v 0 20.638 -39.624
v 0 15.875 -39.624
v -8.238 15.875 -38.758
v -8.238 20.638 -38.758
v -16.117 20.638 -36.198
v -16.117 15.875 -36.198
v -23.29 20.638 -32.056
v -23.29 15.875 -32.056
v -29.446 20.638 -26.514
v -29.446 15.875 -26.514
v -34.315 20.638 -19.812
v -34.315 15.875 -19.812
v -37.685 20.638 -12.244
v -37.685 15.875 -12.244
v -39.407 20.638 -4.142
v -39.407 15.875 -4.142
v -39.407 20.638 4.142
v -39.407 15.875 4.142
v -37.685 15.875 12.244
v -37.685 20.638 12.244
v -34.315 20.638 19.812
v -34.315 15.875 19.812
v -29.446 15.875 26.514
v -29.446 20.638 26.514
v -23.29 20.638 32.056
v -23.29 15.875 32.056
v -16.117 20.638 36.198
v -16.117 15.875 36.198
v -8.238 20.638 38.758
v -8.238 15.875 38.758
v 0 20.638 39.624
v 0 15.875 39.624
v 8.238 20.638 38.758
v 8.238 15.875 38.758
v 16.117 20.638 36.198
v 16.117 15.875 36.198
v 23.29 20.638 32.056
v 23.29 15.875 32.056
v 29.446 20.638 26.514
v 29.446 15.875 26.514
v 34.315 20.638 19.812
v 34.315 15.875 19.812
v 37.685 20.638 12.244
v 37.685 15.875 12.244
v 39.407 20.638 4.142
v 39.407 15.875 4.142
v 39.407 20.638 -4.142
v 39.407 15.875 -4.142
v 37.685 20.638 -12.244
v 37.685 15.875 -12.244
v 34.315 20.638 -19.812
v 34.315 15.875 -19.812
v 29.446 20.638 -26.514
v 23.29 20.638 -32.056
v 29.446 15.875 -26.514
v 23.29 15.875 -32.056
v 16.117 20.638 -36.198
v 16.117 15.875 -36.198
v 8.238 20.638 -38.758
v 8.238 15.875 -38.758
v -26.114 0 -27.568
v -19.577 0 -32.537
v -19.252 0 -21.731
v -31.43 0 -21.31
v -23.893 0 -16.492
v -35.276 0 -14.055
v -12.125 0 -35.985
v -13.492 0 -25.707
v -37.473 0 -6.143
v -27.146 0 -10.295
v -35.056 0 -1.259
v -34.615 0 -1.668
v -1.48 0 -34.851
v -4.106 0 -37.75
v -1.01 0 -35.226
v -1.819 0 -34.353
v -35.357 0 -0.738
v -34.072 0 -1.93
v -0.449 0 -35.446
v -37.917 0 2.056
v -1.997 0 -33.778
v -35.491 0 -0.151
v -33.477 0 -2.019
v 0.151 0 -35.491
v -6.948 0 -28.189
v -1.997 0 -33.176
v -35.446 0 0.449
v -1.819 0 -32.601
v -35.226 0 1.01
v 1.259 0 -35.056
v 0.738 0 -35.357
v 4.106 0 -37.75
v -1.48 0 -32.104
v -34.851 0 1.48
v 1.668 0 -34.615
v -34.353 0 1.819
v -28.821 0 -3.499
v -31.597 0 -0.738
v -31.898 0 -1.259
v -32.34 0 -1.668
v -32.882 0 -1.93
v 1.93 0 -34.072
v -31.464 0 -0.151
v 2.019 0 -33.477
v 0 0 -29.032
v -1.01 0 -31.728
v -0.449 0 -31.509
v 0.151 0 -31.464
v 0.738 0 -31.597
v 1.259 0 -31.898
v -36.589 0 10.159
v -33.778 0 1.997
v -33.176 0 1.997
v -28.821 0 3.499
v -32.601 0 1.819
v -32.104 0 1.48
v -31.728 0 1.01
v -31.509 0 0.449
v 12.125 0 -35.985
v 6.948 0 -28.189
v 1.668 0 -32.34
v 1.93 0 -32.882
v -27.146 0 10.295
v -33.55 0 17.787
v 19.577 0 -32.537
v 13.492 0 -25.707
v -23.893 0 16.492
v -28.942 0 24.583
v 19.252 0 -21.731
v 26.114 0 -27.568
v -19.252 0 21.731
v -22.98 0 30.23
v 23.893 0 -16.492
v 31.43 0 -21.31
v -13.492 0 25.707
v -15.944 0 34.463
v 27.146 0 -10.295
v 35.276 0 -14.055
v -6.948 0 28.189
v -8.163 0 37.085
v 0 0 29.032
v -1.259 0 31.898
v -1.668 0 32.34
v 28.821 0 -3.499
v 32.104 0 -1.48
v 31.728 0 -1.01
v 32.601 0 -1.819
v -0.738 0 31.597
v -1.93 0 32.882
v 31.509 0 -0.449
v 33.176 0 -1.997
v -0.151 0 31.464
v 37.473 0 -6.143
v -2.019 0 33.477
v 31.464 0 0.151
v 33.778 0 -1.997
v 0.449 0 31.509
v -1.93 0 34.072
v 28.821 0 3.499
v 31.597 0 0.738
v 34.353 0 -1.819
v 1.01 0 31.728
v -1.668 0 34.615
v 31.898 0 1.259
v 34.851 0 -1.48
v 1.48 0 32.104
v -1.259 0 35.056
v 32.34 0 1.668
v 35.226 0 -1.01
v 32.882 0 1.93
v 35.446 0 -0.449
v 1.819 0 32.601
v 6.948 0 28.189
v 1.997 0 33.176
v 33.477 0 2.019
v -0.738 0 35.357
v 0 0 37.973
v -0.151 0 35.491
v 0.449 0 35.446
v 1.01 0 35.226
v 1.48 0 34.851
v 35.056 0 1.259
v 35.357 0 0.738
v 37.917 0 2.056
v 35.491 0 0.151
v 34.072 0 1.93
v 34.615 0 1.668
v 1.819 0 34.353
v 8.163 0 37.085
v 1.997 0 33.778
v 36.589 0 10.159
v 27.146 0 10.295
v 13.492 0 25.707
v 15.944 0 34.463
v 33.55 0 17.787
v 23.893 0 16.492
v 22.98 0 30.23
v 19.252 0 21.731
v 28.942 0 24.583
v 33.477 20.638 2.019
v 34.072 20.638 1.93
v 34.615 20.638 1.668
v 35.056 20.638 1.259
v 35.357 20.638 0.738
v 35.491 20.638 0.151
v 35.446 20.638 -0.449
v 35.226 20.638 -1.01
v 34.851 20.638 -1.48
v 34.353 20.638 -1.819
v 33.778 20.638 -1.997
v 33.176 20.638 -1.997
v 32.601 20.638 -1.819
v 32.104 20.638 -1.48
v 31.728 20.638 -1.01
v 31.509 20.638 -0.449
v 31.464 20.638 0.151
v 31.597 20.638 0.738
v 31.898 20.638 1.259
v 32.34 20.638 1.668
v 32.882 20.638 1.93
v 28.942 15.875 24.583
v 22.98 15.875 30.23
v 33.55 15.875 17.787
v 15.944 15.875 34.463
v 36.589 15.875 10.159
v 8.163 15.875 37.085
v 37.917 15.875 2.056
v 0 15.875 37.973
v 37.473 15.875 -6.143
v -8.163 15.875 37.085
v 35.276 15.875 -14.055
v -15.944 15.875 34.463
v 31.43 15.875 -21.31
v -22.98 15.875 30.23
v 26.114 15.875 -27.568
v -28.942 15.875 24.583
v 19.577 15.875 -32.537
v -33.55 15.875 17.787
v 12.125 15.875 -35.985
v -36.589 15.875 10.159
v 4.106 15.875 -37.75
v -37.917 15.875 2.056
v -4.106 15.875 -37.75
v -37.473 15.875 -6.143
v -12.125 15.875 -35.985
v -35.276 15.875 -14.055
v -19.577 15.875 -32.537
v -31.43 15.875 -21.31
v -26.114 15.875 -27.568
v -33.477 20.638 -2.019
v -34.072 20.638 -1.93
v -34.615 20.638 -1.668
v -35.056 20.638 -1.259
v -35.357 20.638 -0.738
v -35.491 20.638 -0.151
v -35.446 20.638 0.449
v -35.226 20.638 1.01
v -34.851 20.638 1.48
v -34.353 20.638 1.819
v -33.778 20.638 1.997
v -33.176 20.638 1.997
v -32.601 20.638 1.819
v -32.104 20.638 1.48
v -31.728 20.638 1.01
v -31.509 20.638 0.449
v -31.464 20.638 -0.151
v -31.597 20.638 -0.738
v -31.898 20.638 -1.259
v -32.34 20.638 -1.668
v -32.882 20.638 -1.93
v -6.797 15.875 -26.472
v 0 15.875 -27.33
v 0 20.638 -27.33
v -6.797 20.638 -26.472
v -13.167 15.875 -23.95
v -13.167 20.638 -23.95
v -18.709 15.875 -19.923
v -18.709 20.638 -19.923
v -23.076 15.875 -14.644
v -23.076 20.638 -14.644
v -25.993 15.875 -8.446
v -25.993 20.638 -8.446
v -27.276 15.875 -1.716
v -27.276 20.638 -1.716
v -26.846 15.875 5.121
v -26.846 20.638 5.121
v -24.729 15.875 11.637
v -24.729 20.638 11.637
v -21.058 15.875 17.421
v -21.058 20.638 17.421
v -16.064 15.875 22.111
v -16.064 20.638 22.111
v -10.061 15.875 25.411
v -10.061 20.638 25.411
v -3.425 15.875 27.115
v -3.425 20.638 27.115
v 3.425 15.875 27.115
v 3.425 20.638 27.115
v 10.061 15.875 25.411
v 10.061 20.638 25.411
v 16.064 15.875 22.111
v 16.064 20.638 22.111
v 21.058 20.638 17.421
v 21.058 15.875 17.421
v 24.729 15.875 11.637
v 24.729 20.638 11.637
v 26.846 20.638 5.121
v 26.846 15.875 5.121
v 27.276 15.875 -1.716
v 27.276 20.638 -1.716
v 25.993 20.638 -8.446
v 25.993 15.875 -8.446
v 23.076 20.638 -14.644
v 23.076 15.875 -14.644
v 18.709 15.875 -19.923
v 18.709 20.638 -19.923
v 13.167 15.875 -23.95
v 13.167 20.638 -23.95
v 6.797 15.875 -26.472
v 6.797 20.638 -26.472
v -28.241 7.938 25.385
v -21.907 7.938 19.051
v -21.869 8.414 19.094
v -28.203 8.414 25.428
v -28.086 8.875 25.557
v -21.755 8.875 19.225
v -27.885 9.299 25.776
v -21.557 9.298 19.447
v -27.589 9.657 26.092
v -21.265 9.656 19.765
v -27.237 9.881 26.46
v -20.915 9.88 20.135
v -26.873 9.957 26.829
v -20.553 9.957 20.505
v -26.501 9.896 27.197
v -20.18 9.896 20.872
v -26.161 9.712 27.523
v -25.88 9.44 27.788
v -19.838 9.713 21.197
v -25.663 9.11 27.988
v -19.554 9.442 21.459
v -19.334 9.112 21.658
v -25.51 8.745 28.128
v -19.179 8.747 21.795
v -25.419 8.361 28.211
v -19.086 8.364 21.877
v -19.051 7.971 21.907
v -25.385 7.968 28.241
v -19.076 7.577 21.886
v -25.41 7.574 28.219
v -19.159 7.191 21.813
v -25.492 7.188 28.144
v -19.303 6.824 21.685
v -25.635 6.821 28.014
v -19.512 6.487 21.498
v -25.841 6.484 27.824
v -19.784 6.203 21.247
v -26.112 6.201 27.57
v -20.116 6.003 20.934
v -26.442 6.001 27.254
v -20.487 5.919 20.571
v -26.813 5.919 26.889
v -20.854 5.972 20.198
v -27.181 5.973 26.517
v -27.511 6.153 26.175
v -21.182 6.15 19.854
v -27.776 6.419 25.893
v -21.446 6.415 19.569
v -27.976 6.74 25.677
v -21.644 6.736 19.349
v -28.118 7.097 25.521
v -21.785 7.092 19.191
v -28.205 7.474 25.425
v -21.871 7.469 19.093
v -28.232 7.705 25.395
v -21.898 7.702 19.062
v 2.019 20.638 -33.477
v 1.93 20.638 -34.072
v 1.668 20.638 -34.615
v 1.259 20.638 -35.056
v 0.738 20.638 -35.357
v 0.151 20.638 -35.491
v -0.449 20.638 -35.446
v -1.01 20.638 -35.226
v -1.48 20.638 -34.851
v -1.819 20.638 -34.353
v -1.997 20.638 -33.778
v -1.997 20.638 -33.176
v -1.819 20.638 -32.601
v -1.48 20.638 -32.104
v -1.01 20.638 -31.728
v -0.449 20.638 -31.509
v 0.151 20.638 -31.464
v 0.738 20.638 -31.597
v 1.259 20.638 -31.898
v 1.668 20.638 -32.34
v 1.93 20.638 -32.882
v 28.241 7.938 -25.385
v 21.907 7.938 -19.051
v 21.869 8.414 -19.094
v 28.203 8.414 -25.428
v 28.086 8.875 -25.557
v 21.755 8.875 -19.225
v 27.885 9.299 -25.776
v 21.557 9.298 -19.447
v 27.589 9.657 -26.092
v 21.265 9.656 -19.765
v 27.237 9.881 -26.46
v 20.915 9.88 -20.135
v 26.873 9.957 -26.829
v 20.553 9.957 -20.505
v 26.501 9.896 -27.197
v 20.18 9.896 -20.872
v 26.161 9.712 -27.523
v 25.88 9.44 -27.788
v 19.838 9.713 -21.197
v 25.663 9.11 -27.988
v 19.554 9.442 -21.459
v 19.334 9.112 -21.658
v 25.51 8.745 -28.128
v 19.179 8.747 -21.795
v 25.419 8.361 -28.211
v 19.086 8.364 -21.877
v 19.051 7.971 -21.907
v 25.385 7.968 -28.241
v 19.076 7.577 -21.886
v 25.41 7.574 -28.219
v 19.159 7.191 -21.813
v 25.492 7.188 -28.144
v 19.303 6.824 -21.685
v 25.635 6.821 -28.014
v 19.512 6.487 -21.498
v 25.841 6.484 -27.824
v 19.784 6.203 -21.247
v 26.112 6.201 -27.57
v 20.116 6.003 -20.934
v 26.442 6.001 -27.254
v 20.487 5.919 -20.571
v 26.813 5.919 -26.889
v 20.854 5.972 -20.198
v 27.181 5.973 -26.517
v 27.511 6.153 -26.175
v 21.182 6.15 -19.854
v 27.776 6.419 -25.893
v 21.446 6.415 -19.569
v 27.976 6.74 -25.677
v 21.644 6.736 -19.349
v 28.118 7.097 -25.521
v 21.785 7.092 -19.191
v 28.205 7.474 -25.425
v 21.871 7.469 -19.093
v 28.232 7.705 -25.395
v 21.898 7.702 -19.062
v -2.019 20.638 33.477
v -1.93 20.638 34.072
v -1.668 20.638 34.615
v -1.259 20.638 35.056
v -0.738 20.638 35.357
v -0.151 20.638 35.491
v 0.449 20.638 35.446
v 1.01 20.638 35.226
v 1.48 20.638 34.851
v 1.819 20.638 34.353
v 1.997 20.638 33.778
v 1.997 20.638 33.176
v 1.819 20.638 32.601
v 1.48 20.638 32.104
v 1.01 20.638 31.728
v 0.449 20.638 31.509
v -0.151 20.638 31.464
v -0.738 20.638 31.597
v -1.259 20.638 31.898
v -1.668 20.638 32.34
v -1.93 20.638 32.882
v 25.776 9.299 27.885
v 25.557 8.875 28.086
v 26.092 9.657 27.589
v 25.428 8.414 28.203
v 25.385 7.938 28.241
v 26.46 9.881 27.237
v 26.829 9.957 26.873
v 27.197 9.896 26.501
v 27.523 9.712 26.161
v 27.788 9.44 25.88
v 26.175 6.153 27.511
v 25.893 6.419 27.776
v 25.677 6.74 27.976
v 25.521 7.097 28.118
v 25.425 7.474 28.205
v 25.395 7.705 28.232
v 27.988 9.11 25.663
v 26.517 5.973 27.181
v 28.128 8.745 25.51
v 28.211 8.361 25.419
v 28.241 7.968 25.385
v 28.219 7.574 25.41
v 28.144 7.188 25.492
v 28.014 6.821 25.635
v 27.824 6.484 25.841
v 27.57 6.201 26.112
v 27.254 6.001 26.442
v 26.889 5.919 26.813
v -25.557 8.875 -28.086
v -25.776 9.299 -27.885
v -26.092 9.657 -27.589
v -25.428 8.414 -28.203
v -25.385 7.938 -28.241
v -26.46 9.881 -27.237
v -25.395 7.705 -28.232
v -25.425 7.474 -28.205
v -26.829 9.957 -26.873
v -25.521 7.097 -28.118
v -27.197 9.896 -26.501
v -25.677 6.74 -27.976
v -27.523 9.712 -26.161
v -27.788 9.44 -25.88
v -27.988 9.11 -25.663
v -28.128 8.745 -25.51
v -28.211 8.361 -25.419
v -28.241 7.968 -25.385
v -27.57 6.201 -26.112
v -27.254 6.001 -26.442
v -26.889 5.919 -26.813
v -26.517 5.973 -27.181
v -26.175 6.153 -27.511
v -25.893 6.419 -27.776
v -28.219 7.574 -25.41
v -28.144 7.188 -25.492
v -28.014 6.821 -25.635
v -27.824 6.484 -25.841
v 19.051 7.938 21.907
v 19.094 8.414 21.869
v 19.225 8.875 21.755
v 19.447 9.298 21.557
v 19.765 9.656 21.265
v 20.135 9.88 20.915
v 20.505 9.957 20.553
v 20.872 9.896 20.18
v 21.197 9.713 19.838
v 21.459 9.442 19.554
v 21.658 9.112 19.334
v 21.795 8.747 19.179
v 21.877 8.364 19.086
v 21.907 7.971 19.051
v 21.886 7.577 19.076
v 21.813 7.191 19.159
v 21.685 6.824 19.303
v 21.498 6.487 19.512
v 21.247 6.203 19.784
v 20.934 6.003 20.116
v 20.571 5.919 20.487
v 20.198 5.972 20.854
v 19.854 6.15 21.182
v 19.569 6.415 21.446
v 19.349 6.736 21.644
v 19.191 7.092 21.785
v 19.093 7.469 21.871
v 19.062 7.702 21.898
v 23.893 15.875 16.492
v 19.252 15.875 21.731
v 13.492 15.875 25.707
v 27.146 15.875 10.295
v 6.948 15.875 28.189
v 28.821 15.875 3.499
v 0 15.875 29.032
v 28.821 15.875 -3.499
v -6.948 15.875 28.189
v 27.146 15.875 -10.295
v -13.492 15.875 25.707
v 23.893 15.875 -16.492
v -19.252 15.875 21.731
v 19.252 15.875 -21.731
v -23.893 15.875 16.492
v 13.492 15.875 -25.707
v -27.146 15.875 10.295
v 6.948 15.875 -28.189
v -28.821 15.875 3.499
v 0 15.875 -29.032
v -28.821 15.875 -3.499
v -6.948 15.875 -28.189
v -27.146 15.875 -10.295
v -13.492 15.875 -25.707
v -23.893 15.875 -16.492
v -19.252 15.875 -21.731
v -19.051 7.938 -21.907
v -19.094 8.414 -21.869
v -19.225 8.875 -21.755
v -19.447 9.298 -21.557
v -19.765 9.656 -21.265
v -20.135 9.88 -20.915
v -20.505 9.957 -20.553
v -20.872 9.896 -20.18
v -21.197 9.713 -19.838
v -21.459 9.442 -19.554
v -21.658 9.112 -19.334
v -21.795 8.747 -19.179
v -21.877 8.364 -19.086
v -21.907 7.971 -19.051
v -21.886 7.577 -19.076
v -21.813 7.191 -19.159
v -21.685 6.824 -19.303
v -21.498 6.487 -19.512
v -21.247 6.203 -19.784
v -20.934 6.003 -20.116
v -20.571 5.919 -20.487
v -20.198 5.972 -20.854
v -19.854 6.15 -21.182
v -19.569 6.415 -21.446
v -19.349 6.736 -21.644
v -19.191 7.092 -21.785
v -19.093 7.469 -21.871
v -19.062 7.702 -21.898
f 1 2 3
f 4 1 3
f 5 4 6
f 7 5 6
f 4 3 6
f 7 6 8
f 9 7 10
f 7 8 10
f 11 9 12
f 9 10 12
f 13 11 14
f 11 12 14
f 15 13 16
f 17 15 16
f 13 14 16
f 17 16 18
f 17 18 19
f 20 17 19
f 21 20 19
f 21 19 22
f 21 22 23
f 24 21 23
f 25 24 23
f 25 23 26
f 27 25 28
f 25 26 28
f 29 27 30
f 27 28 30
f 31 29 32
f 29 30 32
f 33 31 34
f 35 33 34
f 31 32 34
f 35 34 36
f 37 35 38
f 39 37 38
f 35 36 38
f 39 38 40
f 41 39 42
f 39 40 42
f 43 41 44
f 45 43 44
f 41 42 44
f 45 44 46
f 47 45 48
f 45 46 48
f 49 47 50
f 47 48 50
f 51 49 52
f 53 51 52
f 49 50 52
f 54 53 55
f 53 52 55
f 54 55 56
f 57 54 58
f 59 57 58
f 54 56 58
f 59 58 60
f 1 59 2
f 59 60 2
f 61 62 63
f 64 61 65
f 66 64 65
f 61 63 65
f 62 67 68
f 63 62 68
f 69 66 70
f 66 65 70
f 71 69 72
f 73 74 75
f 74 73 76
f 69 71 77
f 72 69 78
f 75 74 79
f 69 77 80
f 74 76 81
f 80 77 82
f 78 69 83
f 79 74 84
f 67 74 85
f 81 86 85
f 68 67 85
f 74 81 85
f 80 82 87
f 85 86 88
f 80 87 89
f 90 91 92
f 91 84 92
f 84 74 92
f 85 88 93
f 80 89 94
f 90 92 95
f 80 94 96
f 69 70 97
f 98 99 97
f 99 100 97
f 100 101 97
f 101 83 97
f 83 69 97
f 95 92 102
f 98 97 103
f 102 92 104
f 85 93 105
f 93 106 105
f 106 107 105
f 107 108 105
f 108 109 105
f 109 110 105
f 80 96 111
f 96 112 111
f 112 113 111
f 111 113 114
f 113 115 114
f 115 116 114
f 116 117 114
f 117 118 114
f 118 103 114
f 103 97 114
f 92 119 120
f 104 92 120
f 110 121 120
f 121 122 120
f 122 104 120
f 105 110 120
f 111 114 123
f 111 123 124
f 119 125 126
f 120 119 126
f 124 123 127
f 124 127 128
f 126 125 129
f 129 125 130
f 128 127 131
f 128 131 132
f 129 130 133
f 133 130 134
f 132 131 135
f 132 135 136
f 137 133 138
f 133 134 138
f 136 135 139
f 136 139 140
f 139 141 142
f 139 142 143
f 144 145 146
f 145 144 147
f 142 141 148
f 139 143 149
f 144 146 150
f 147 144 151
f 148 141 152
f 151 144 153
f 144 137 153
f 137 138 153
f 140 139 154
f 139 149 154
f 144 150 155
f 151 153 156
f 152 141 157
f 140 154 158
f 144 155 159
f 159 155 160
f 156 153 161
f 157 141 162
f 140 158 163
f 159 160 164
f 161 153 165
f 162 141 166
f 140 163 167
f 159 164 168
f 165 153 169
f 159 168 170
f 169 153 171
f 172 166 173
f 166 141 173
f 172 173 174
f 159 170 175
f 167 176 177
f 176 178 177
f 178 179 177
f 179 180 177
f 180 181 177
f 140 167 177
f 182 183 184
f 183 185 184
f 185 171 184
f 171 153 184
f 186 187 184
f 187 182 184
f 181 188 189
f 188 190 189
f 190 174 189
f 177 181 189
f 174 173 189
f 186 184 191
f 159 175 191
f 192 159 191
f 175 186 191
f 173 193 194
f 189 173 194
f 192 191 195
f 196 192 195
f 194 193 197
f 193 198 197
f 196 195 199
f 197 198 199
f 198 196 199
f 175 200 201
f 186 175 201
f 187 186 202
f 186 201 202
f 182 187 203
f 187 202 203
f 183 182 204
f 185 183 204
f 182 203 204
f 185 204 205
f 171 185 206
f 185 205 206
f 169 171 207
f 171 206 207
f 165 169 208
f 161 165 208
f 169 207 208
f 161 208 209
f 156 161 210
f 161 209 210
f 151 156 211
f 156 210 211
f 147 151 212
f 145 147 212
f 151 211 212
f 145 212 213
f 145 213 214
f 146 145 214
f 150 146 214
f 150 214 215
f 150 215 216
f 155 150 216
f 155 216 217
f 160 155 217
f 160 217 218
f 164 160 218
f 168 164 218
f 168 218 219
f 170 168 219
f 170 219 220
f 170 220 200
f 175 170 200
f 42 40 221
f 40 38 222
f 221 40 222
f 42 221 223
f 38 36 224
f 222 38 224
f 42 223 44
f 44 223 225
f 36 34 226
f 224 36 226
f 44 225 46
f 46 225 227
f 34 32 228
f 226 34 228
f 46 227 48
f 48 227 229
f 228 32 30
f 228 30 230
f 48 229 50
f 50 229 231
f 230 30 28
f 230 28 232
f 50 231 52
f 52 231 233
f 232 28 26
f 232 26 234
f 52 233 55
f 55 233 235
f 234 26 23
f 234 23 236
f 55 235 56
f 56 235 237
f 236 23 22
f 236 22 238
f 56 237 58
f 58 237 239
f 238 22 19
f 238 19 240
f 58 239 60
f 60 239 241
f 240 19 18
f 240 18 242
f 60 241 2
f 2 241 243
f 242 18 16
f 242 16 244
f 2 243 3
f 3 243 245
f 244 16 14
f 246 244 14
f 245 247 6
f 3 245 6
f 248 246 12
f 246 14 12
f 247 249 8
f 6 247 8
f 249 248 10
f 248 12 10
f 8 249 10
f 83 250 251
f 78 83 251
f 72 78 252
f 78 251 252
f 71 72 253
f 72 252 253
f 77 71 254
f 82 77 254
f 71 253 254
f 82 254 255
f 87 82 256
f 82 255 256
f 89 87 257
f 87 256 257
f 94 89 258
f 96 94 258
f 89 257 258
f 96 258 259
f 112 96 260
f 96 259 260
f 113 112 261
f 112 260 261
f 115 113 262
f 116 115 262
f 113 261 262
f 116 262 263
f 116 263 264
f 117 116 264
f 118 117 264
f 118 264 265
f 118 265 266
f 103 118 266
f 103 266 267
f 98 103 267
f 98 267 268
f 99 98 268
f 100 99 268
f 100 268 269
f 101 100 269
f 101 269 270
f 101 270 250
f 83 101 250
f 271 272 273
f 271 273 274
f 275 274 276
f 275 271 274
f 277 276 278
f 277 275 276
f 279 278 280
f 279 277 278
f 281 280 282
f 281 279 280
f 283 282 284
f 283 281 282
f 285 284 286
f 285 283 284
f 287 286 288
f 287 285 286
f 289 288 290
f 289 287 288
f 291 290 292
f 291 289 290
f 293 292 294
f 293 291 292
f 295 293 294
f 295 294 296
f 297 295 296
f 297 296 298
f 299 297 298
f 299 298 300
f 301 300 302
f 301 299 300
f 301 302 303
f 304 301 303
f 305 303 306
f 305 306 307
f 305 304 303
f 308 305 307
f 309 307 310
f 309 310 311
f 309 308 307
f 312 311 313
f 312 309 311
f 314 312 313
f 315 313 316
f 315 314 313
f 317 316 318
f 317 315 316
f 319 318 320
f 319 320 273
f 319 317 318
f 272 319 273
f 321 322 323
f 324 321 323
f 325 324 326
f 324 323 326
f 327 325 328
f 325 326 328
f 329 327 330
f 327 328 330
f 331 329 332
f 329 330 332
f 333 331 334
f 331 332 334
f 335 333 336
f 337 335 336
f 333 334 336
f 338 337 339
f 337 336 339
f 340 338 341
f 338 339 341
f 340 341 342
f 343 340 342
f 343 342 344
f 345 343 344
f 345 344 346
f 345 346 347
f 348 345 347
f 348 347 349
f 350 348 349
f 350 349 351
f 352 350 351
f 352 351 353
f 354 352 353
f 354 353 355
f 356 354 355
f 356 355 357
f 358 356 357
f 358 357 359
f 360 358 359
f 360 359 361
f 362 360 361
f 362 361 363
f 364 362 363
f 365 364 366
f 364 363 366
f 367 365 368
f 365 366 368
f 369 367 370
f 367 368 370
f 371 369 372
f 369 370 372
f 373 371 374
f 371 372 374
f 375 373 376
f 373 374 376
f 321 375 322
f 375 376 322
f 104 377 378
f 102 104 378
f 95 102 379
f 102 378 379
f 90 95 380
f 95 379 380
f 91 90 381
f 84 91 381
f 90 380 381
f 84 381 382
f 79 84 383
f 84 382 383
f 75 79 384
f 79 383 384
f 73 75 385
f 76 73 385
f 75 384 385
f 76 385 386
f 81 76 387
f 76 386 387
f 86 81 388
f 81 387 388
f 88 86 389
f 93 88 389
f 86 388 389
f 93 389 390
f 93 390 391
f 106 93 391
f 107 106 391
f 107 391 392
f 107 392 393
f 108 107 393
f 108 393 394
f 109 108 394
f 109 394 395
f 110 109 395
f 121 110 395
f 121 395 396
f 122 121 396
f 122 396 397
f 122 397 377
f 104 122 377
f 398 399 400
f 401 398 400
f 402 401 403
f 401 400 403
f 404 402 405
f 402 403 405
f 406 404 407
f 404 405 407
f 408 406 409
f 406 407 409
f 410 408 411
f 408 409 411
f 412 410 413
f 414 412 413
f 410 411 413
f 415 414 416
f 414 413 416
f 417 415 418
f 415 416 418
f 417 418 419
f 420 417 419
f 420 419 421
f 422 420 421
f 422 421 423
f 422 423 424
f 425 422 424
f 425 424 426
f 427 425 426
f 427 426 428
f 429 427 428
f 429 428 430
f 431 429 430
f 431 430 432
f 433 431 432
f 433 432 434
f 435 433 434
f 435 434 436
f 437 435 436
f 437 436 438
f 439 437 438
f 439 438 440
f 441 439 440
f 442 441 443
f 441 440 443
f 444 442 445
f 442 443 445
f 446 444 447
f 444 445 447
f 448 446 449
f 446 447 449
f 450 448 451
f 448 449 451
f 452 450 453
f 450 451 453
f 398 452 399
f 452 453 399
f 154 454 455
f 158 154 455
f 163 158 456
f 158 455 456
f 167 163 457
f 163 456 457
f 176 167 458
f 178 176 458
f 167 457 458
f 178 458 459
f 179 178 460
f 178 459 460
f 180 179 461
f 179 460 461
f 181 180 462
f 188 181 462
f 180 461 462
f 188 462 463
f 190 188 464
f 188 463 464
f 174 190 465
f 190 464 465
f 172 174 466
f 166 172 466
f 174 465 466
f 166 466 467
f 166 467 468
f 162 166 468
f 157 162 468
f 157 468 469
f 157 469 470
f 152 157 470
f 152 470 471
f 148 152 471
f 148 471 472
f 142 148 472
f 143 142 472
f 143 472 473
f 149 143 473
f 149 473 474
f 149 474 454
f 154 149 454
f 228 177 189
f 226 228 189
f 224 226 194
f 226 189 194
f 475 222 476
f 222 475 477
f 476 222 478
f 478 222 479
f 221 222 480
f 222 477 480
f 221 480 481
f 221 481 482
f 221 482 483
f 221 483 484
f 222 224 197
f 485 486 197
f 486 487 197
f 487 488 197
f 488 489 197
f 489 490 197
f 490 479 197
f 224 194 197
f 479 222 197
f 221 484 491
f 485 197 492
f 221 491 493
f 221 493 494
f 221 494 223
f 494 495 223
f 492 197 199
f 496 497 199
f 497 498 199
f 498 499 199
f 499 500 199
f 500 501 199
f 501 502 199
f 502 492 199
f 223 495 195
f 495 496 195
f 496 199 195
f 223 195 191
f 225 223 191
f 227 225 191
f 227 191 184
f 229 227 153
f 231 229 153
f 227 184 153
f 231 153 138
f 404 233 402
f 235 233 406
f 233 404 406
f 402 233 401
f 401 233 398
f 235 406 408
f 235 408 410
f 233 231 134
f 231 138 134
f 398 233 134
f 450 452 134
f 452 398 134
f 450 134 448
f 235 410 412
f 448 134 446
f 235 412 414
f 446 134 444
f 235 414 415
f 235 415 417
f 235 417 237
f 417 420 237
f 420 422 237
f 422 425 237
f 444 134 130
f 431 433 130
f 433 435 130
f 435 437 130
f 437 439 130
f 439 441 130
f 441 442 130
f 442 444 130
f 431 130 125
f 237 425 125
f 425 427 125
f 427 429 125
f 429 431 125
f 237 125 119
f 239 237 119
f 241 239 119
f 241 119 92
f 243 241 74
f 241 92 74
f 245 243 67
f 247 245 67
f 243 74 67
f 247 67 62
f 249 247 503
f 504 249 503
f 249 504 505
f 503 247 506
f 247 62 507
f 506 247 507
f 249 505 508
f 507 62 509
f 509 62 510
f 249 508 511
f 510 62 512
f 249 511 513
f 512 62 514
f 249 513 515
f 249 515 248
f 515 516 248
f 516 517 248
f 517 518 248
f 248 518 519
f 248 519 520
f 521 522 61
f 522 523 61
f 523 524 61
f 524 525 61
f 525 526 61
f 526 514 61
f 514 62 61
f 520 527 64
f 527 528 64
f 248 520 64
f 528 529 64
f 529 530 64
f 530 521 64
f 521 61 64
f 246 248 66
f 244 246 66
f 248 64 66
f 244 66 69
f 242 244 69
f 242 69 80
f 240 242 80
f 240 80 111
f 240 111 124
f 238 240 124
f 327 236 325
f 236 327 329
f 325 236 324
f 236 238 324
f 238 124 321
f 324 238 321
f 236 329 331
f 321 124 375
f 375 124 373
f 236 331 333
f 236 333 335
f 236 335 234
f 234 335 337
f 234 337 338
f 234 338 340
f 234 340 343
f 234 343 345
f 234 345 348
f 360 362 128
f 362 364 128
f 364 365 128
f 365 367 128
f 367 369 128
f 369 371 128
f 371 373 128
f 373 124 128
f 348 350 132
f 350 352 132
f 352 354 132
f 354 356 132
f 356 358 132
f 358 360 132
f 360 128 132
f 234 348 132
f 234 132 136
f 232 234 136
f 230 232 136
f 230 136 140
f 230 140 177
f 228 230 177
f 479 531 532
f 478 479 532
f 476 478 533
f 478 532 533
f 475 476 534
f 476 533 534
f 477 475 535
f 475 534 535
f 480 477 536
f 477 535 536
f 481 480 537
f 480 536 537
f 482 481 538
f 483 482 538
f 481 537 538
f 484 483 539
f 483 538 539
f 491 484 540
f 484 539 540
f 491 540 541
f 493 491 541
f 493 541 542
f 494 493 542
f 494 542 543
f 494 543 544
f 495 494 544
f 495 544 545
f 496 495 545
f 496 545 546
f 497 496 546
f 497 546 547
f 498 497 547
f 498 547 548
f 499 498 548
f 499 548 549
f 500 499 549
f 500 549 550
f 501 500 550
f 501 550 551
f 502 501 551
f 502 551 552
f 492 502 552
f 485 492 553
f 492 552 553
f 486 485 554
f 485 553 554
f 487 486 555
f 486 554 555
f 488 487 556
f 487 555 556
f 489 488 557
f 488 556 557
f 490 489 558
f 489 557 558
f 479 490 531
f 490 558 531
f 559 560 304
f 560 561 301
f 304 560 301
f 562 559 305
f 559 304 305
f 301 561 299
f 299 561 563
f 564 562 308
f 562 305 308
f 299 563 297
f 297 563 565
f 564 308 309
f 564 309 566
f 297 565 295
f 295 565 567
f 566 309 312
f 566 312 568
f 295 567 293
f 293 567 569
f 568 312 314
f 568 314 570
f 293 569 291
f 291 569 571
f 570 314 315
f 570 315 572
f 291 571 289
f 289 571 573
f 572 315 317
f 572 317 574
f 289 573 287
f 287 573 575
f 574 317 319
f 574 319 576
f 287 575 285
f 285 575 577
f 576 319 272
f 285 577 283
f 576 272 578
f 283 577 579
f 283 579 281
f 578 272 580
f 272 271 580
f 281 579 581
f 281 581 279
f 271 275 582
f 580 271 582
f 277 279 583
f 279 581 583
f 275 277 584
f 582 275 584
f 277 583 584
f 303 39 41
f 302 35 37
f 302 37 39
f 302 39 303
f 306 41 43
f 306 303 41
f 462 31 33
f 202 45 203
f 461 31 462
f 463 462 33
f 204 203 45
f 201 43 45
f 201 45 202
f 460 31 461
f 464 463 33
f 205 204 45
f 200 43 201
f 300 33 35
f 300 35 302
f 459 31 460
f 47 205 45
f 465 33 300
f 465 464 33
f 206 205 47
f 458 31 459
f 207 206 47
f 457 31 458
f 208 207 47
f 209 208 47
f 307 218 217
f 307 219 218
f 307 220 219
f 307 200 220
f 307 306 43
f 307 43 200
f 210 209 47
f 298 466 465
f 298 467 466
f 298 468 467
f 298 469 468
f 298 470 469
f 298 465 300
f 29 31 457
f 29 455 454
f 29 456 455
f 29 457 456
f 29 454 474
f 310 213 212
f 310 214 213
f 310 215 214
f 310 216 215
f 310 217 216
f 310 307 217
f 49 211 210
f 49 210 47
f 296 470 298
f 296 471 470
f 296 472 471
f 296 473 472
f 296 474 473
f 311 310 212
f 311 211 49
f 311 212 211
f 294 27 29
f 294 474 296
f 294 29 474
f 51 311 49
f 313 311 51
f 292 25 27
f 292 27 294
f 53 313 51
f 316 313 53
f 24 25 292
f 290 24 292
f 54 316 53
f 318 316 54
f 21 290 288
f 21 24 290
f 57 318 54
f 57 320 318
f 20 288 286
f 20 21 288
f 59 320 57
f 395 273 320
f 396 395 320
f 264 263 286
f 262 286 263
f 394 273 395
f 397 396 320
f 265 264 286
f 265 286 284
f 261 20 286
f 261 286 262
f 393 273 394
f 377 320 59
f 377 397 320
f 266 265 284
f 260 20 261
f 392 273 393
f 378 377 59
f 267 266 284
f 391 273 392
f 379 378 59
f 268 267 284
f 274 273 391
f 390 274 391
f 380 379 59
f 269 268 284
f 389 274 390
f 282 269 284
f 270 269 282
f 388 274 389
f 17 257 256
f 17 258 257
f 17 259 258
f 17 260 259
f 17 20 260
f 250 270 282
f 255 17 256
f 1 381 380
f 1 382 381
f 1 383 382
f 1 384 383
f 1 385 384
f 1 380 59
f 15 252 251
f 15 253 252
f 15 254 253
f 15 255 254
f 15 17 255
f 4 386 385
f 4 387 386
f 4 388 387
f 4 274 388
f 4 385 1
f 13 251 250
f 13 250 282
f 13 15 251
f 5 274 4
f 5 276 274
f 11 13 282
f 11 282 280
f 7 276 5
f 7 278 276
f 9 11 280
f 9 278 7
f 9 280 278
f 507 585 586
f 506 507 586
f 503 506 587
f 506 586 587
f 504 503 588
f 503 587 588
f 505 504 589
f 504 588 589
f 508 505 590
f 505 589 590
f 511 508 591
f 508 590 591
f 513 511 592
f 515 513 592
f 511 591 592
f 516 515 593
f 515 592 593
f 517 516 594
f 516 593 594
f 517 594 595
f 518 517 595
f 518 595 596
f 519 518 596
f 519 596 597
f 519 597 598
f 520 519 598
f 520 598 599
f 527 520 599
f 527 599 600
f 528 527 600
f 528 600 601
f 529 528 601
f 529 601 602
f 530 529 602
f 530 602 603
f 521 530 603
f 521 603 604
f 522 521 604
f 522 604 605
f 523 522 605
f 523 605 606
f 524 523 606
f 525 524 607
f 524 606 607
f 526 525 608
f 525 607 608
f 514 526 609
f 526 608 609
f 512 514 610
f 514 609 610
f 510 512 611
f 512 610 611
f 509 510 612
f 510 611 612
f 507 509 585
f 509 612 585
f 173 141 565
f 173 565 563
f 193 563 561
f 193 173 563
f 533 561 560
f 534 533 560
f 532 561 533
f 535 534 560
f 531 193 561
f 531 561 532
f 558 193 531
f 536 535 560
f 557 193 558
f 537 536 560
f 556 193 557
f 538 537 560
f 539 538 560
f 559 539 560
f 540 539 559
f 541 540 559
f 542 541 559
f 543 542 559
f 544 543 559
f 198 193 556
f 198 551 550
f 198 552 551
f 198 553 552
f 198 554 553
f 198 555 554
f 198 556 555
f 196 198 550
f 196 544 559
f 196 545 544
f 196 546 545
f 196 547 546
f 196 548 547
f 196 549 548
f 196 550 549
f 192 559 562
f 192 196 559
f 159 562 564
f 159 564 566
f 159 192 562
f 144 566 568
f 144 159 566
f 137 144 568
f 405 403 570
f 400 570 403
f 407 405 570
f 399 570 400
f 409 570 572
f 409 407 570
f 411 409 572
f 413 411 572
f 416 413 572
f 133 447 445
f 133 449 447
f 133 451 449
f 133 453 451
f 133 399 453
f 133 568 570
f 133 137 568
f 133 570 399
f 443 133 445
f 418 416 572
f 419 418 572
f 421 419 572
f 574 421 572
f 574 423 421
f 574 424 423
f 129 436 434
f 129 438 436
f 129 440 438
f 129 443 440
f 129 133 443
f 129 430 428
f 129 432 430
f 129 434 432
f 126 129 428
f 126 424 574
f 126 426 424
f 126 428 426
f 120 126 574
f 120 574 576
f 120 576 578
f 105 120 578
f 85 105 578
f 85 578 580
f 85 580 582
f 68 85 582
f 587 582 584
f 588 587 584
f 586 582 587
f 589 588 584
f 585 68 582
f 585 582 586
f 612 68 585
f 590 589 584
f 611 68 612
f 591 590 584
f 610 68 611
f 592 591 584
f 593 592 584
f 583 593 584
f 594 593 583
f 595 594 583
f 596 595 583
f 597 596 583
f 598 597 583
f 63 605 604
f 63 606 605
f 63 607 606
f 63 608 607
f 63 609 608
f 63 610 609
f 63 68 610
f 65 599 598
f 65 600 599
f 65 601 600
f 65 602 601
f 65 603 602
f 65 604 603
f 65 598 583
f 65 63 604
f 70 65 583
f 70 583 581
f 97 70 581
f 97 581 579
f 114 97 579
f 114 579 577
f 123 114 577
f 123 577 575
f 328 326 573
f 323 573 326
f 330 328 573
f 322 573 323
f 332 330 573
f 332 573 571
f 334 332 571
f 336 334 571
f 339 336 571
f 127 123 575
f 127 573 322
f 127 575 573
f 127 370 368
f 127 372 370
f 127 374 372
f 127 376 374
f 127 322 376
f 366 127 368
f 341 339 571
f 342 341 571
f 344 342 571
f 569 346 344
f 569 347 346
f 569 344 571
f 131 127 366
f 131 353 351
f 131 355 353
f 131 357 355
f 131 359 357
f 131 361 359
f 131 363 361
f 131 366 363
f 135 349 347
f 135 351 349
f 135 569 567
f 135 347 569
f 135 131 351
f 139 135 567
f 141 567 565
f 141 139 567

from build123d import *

# Parameters (mm, degrees)
SKETCH1_R           = 37.973
SKETCH1_R_2         = 29.0322
BOSS_EXTRUDE1_DEPTH = 15.875
SKETCH3_R           = 39.624
SKETCH3_R_2         = 27.3304
BOSS_EXTRUDE2_DEPTH = 4.7625
SKETCH4_R           = 2.0193
CUT_EXTRUDE1_DEPTH  = 38.5445
CIRPATTERN2_COUNT   = 4
SKETCH5_R           = 2.0193
CUT_EXTRUDE2_DEPTH  = 52.2605
CIRPATTERN3_COUNT   = 4


with BuildPart() as part:
    # Sketch1 → Boss-Extrude1 (new body)
    with BuildSketch(Plane(origin=(0, 0, 0), x_dir=(1, 0, 0), z_dir=(0, 1, 0))):
        with Locations(Location((0, 0, 0), (0, 0, 270))):
            Circle(SKETCH1_R)
        with Locations(Location((0, 0, 0), (0, 0, 270))):
            Circle(SKETCH1_R_2, mode=Mode.SUBTRACT)
    extrude(amount=BOSS_EXTRUDE1_DEPTH)

    # Sketch3 → Boss-Extrude2 (add)
    with BuildSketch(Plane(origin=(0, 15.875, 0), x_dir=(1, 0, 0), z_dir=(0, 1, 0))):
        with Locations(Location((0, 0, 0), (0, 0, 90))):
            Circle(SKETCH3_R)
        with Locations(Location((0, 0, 0), (0, 0, 90))):
            Circle(SKETCH3_R_2, mode=Mode.SUBTRACT)
    extrude(amount=BOSS_EXTRUDE2_DEPTH)

    # Sketch4 → Cut-Extrude1 (cut)
    with BuildSketch(Plane(origin=(0, 20.6375, 0), x_dir=(1, 0, 0), z_dir=(0, 1, 0))):
        with Locations(Location((33.4772, 0, 0), (0, 0, 270))):
            Circle(SKETCH4_R)
    cut_extrude1 = extrude(amount=-CUT_EXTRUDE1_DEPTH, mode=Mode.SUBTRACT)

    # CirPattern2: Cut-Extrude1 ×4 about axis
    cirpattern2_axis = Axis((0, 0, 0), (0, 1, 0))
    for i in range(1, CIRPATTERN2_COUNT):
        add(cut_extrude1.rotate(cirpattern2_axis, i * 360 / CIRPATTERN2_COUNT), mode=Mode.SUBTRACT)

    # Sketch5 → Cut-Extrude2 (cut)
    with BuildSketch(Plane(origin=(0, 0, 0), x_dir=(-0.7071067811865477, 0, -0.7071067811865475), z_dir=(0.7071067811865475, 0, -0.7071067811865477))):
        with Locations((0, 7.9375)):
            Circle(SKETCH5_R)
    cut_extrude2 = extrude(amount=-CUT_EXTRUDE2_DEPTH, mode=Mode.SUBTRACT)

    # CirPattern3: Cut-Extrude2 ×4 about axis
    cirpattern3_axis = Axis((0, 15.875, 0), (0, -1, 0))
    for i in range(1, CIRPATTERN3_COUNT):
        add(cut_extrude2.rotate(cirpattern3_axis, i * 360 / CIRPATTERN3_COUNT), mode=Mode.SUBTRACT)


solid = part.part
